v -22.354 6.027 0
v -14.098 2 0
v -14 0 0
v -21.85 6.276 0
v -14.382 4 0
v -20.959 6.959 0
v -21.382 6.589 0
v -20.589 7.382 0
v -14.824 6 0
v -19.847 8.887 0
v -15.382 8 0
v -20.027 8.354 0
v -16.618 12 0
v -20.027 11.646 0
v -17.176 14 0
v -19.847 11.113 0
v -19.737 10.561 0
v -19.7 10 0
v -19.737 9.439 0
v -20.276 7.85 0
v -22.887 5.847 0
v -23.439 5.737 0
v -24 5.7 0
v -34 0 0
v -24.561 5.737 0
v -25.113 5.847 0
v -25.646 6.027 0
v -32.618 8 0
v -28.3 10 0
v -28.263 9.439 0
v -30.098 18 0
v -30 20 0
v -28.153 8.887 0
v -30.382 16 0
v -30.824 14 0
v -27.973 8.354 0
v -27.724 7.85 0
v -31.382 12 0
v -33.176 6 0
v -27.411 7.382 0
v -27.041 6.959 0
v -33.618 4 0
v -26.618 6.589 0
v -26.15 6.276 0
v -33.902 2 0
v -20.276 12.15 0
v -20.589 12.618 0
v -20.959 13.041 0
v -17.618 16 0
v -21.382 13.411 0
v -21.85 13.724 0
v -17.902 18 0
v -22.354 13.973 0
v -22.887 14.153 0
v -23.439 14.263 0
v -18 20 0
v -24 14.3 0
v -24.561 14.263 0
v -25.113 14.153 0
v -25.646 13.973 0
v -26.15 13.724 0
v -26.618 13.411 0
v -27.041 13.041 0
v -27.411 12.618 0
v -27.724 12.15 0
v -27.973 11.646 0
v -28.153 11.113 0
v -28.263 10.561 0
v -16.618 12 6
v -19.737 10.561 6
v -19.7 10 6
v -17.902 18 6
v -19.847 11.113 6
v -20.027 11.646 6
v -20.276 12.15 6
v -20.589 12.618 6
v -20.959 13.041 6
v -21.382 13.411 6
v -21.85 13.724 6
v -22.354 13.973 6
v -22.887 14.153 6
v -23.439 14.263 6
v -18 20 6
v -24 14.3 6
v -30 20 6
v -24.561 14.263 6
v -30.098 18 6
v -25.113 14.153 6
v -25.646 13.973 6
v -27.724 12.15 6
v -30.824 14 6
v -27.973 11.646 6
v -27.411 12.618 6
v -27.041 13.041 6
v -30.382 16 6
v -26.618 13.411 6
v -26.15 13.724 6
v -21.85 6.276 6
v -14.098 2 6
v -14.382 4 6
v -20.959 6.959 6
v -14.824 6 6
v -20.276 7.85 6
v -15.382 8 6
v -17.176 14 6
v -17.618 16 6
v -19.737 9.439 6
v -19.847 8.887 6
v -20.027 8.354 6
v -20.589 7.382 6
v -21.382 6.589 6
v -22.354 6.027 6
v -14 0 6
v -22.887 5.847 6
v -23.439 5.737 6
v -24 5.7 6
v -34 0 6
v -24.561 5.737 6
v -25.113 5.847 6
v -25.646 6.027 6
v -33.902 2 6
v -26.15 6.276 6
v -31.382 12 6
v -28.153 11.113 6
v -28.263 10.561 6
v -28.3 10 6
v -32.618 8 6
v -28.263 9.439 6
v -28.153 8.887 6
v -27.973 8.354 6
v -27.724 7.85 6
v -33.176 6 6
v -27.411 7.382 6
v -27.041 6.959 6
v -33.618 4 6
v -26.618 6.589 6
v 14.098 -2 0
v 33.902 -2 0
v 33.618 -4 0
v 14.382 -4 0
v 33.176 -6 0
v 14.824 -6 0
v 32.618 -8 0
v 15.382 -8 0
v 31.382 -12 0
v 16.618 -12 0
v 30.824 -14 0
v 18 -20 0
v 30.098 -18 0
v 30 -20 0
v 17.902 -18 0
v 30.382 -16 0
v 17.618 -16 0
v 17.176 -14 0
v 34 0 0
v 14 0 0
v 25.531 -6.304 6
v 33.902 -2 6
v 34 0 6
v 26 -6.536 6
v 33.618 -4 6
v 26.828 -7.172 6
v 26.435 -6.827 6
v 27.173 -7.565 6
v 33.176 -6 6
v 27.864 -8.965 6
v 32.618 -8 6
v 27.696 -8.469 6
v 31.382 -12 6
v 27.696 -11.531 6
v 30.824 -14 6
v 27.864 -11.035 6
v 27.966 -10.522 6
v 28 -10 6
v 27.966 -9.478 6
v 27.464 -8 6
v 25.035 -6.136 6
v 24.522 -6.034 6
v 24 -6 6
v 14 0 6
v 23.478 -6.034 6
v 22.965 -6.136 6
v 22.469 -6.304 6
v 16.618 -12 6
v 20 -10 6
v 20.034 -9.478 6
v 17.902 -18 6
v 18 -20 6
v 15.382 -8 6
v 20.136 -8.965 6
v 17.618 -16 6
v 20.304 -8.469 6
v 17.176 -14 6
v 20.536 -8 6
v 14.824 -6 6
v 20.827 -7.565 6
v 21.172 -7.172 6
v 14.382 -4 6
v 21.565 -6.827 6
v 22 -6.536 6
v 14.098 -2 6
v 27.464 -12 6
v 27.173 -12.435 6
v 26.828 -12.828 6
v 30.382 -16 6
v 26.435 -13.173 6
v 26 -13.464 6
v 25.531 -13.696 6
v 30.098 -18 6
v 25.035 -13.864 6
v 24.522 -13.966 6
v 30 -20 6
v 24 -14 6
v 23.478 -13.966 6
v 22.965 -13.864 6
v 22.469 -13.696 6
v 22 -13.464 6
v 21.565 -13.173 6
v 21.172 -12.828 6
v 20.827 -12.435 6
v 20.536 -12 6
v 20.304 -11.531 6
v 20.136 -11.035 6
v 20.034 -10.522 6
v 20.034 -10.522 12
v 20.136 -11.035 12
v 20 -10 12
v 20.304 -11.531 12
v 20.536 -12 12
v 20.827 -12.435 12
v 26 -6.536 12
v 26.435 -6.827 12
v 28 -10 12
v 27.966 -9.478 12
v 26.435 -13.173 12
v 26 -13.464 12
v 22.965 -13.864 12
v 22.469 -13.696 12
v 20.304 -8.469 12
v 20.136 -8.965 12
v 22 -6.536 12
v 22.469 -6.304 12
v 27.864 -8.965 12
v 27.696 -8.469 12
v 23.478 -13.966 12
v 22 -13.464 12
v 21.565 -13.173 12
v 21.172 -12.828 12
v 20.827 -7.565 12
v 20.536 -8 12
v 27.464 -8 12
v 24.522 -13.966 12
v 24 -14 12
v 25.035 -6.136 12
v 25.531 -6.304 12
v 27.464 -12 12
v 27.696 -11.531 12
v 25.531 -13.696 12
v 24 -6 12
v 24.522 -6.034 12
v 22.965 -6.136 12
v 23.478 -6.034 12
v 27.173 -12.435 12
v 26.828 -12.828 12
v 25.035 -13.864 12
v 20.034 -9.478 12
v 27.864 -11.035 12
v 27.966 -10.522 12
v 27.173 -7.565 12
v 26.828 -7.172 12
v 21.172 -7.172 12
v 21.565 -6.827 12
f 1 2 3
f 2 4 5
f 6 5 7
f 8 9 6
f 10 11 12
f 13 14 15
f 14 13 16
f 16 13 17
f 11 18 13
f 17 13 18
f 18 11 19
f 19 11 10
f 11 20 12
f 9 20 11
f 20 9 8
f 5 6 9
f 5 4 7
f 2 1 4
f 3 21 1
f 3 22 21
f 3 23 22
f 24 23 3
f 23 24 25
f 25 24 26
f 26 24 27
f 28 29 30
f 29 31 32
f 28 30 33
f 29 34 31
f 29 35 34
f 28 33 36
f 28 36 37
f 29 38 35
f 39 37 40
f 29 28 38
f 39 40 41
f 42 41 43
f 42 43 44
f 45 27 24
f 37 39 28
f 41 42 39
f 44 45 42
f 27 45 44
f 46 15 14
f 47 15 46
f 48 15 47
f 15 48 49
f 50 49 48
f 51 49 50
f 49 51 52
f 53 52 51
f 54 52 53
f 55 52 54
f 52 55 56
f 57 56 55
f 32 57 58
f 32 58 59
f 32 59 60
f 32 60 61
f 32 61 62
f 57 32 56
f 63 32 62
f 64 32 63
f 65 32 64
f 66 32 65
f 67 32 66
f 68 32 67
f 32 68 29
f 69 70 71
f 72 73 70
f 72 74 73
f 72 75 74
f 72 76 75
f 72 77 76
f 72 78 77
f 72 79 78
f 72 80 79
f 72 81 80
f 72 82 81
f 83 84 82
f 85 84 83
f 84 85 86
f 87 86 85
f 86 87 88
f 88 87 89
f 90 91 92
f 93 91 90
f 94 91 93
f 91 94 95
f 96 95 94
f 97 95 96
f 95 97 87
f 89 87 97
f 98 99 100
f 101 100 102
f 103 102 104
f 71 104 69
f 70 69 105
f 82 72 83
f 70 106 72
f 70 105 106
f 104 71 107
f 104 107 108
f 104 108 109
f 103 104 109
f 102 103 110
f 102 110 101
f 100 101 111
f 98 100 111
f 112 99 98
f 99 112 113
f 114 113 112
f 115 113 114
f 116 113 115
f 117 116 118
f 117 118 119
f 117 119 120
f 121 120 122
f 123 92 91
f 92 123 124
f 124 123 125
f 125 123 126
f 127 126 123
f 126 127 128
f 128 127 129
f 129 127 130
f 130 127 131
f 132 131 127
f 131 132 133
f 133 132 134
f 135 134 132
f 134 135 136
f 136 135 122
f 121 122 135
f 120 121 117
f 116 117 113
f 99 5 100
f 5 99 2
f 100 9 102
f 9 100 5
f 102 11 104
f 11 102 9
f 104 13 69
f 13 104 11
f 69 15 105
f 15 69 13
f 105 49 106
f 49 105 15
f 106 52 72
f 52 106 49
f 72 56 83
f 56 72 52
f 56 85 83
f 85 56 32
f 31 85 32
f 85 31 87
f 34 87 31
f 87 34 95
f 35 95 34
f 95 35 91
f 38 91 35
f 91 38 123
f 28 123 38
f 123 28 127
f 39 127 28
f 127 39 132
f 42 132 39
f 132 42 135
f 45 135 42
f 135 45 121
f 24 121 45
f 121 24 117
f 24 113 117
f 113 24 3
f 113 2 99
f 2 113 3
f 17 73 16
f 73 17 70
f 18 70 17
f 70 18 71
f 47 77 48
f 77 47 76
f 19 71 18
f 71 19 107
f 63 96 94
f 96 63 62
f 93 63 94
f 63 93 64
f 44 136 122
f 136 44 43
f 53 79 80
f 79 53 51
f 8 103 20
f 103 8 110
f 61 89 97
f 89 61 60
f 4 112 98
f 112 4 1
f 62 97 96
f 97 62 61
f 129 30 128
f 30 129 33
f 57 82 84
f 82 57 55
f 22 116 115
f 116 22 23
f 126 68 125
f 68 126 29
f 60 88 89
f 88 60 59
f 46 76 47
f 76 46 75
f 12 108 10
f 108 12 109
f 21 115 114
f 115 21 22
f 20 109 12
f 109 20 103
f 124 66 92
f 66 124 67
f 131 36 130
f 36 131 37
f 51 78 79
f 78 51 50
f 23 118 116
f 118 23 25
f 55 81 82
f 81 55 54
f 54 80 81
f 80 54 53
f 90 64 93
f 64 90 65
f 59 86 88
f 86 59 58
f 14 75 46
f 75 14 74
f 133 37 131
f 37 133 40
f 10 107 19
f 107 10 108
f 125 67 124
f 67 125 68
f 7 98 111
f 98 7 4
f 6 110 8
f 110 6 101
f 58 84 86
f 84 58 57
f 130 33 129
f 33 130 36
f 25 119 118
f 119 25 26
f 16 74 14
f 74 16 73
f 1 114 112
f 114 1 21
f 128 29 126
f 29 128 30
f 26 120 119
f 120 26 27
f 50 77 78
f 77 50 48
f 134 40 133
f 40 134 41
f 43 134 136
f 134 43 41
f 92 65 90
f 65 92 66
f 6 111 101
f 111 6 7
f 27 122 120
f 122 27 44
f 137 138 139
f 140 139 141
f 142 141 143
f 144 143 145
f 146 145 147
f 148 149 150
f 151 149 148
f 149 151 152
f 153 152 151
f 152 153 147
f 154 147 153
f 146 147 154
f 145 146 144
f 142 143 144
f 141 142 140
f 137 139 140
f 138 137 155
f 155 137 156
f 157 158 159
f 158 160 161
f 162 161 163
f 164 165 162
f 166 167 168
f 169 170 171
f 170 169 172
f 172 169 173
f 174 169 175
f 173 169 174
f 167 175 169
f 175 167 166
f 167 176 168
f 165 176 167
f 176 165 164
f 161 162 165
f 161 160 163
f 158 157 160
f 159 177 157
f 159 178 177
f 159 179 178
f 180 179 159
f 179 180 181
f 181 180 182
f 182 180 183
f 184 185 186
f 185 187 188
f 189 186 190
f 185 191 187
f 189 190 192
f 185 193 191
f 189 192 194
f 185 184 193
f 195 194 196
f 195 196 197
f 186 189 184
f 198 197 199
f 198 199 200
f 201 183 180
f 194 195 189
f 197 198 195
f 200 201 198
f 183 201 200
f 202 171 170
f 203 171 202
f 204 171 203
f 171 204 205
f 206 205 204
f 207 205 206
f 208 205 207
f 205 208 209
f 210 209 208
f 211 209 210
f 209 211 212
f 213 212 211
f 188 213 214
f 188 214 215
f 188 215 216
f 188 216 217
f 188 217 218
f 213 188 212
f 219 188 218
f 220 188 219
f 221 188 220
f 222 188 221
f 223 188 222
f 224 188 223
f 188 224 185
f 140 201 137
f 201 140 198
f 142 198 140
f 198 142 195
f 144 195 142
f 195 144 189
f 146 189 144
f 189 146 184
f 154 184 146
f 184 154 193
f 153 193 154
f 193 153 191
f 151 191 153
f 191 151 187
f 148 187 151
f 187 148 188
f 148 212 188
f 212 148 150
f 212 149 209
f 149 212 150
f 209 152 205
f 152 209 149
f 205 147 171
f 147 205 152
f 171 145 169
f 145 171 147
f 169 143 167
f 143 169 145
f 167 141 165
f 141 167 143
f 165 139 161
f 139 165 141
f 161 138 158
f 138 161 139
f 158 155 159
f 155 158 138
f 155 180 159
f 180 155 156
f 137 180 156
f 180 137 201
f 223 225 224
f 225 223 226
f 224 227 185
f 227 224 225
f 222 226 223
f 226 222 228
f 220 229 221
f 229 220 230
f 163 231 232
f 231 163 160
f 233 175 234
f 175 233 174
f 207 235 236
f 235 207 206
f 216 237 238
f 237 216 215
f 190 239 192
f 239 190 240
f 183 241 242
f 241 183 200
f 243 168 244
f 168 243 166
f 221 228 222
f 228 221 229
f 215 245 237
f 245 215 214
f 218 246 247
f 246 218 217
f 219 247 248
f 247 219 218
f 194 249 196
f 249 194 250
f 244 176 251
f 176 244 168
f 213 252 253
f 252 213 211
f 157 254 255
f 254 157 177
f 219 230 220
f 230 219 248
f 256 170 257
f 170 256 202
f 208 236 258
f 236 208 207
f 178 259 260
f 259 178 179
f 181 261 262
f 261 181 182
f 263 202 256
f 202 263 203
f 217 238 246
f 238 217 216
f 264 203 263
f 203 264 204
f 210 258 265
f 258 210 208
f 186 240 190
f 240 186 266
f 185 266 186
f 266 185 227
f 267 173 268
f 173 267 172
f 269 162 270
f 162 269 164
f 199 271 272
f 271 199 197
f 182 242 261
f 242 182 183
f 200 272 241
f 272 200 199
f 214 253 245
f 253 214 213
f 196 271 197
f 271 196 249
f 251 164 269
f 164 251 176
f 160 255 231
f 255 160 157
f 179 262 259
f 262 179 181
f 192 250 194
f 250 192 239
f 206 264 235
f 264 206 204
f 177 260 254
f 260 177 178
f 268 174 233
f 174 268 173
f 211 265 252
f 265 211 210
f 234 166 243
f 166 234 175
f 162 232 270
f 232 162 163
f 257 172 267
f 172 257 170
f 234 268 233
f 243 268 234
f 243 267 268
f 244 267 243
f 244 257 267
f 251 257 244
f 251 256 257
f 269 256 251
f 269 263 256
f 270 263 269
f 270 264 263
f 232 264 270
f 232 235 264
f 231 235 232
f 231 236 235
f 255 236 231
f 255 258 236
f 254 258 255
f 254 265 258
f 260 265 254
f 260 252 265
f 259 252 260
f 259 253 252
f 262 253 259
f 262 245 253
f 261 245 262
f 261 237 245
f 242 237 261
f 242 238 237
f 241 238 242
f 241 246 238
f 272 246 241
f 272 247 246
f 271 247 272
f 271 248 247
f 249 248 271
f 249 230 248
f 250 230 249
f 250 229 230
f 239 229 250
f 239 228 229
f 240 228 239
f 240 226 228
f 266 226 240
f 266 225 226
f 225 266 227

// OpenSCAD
// Reusable male/female "knuckle" protrusions for joining 3D-printed parts.
//
// A knuckle is a bell-curve-tapered boss with a pin (male) or a matching
// socket (female) along its central Z axis. Mate a male to a female and the
// pin seats in the socket; glue goes in the socket only. First used on the
// mitered corners and hanger of led-matrix-frame-v2.
//
// Canonical orientation (used by all modules here):
//
//     Y
//     ^           tip (y = depth)
//     |         ___________
//     |        /           \
//     |       /             \
//     |      |      *        |     * = pin / socket axis at
//     |      |               |         (0, pin_axis_depth)
//     |       \_____________/
//     |        base (y = 0, width = base_w)
//     +------------------------------> X
//
//  Body is extruded in +Z from z=0 to z=t.
//  Male: pin projects in +Z above the body (z=[t, t+pin_len]).
//  Female: thru-hole along Z through the body.
//
// To mate two parts: place one in canonical orientation and rotate/translate
// the other 180° so its base points at the first's base and the pin axes
// coincide.
//
// All modules take explicit named parameters with the defaults declared
// below, so a caller can override any single dimension without having to
// pass all of them. The library has no top-level dependencies; use with
//     use <path/to/lib/knuckles.scad>
// from your own design.

// ===== Defaults =====
// Keep in sync with led-matrix-frame-v2.scad's corner_* vars so callers
// get the same mechanical fit out of the box.
knuckle_t              = 6;    // Z thickness of the knuckle body
knuckle_base_w         = 20;   // bell-curve width at the base (y=0)
knuckle_tip_w          = 12;   // bell-curve width at the tip (y=depth)
knuckle_depth          = 20;   // depth from base to tip (in +Y)
knuckle_pin_axis_depth = 10;   // depth from base to pin/socket axis
knuckle_pin_d          = 8;    // pin diameter
knuckle_pin_tol        = 0.3;  // per-side clearance between pin and socket
knuckle_pin_len        = 6;    // pin length (projecting above body)
knuckle_slices         = 10;   // bell-curve smoothness

// ===== 2D profile =====
// Bell-curve polygon in the X-Y plane. Width tapers from `base_w` at y=0 to
// `tip_w` at y=`depth` following a cosine profile (flat at the ends, steep
// in the middle). Useful on its own for making a flat gusset or decal that
// matches the knuckle silhouette.
module knuckle_profile(base_w   = knuckle_base_w,
                       tip_w    = knuckle_tip_w,
                       depth    = knuckle_depth,
                       slices   = knuckle_slices) {
    right = [
        for (i = [0 : slices])
            let(frac = i / slices,
                w    = tip_w + (base_w - tip_w) * (0.5 + 0.5 * cos(180 * frac)))
            [ w/2, depth * frac ]
    ];
    left_rev = [
        for (i = [slices : -1 : 0])
            let(frac = i / slices,
                w    = tip_w + (base_w - tip_w) * (0.5 + 0.5 * cos(180 * frac)))
            [ -w/2, depth * frac ]
    ];
    polygon(concat(right, left_rev));
}

// ===== Male knuckle: body + pin projecting in +Z =====
module knuckle_male(t              = knuckle_t,
                    base_w         = knuckle_base_w,
                    tip_w          = knuckle_tip_w,
                    depth          = knuckle_depth,
                    pin_axis_depth = knuckle_pin_axis_depth,
                    pin_d          = knuckle_pin_d,
                    pin_len        = knuckle_pin_len,
                    slices         = knuckle_slices) {
    linear_extrude(height = t)
        knuckle_profile(base_w, tip_w, depth, slices);
    translate([0, pin_axis_depth, t])
        cylinder(d = pin_d, h = pin_len);
}

// ===== Female knuckle: body with Z-axis thru-hole =====
module knuckle_female(t              = knuckle_t,
                      base_w         = knuckle_base_w,
                      tip_w          = knuckle_tip_w,
                      depth          = knuckle_depth,
                      pin_axis_depth = knuckle_pin_axis_depth,
                      pin_d          = knuckle_pin_d,
                      pin_tol        = knuckle_pin_tol,
                      slices         = knuckle_slices) {
    difference() {
        linear_extrude(height = t)
            knuckle_profile(base_w, tip_w, depth, slices);
        translate([0, pin_axis_depth, -0.1])
            cylinder(d = pin_d + 2 * pin_tol, h = t + 0.2);
    }
}

// ===== Pin tip chamfer (optional, applied by caller via difference()) =====
// Returns a thin cylinder-minus-cone shape sitting at the top of the pin,
// suitable for subtracting from a male knuckle to break the pin tip for
// easier insertion. Match `t`, `pin_axis_depth`, `pin_d`, and `pin_len` to
// the knuckle_male() call you want to chamfer.
//
//   difference() {
//       knuckle_male(...);
//       knuckle_pin_tip_chamfer(..., chamfer = 0.5);
//   }
module knuckle_pin_tip_chamfer(t              = knuckle_t,
                               pin_axis_depth = knuckle_pin_axis_depth,
                               pin_d          = knuckle_pin_d,
                               pin_len        = knuckle_pin_len,
                               chamfer        = 0.5) {
    translate([0, pin_axis_depth, t + pin_len - chamfer])
        difference() {
            cylinder(d = pin_d + 1, h = chamfer + 0.01);
            cylinder(d1 = pin_d - 2 * chamfer,
                     d2 = pin_d,
                     h  = chamfer + 0.01);
        }
}

// ===== Demo / self-test =====
// Rendering this file directly shows a male and a female knuckle facing
// each other with a small gap, so you can eyeball the fit. The library
// itself has no side effects when `use <>`-d from another file.
$fn = 48;
_demo_gap = 8;

module _knuckle_demo() {
    // Female on the left, in canonical orientation.
    translate([-_demo_gap/2 - knuckle_base_w, 0, 0])
        knuckle_female();
    // Male on the right, rotated 180° about Z so its base faces the female
    // and the pin points back toward the socket.
    translate([_demo_gap/2 + knuckle_base_w, 0, 0])
        rotate([0, 0, 180])
            knuckle_male();
}

_knuckle_demo();
